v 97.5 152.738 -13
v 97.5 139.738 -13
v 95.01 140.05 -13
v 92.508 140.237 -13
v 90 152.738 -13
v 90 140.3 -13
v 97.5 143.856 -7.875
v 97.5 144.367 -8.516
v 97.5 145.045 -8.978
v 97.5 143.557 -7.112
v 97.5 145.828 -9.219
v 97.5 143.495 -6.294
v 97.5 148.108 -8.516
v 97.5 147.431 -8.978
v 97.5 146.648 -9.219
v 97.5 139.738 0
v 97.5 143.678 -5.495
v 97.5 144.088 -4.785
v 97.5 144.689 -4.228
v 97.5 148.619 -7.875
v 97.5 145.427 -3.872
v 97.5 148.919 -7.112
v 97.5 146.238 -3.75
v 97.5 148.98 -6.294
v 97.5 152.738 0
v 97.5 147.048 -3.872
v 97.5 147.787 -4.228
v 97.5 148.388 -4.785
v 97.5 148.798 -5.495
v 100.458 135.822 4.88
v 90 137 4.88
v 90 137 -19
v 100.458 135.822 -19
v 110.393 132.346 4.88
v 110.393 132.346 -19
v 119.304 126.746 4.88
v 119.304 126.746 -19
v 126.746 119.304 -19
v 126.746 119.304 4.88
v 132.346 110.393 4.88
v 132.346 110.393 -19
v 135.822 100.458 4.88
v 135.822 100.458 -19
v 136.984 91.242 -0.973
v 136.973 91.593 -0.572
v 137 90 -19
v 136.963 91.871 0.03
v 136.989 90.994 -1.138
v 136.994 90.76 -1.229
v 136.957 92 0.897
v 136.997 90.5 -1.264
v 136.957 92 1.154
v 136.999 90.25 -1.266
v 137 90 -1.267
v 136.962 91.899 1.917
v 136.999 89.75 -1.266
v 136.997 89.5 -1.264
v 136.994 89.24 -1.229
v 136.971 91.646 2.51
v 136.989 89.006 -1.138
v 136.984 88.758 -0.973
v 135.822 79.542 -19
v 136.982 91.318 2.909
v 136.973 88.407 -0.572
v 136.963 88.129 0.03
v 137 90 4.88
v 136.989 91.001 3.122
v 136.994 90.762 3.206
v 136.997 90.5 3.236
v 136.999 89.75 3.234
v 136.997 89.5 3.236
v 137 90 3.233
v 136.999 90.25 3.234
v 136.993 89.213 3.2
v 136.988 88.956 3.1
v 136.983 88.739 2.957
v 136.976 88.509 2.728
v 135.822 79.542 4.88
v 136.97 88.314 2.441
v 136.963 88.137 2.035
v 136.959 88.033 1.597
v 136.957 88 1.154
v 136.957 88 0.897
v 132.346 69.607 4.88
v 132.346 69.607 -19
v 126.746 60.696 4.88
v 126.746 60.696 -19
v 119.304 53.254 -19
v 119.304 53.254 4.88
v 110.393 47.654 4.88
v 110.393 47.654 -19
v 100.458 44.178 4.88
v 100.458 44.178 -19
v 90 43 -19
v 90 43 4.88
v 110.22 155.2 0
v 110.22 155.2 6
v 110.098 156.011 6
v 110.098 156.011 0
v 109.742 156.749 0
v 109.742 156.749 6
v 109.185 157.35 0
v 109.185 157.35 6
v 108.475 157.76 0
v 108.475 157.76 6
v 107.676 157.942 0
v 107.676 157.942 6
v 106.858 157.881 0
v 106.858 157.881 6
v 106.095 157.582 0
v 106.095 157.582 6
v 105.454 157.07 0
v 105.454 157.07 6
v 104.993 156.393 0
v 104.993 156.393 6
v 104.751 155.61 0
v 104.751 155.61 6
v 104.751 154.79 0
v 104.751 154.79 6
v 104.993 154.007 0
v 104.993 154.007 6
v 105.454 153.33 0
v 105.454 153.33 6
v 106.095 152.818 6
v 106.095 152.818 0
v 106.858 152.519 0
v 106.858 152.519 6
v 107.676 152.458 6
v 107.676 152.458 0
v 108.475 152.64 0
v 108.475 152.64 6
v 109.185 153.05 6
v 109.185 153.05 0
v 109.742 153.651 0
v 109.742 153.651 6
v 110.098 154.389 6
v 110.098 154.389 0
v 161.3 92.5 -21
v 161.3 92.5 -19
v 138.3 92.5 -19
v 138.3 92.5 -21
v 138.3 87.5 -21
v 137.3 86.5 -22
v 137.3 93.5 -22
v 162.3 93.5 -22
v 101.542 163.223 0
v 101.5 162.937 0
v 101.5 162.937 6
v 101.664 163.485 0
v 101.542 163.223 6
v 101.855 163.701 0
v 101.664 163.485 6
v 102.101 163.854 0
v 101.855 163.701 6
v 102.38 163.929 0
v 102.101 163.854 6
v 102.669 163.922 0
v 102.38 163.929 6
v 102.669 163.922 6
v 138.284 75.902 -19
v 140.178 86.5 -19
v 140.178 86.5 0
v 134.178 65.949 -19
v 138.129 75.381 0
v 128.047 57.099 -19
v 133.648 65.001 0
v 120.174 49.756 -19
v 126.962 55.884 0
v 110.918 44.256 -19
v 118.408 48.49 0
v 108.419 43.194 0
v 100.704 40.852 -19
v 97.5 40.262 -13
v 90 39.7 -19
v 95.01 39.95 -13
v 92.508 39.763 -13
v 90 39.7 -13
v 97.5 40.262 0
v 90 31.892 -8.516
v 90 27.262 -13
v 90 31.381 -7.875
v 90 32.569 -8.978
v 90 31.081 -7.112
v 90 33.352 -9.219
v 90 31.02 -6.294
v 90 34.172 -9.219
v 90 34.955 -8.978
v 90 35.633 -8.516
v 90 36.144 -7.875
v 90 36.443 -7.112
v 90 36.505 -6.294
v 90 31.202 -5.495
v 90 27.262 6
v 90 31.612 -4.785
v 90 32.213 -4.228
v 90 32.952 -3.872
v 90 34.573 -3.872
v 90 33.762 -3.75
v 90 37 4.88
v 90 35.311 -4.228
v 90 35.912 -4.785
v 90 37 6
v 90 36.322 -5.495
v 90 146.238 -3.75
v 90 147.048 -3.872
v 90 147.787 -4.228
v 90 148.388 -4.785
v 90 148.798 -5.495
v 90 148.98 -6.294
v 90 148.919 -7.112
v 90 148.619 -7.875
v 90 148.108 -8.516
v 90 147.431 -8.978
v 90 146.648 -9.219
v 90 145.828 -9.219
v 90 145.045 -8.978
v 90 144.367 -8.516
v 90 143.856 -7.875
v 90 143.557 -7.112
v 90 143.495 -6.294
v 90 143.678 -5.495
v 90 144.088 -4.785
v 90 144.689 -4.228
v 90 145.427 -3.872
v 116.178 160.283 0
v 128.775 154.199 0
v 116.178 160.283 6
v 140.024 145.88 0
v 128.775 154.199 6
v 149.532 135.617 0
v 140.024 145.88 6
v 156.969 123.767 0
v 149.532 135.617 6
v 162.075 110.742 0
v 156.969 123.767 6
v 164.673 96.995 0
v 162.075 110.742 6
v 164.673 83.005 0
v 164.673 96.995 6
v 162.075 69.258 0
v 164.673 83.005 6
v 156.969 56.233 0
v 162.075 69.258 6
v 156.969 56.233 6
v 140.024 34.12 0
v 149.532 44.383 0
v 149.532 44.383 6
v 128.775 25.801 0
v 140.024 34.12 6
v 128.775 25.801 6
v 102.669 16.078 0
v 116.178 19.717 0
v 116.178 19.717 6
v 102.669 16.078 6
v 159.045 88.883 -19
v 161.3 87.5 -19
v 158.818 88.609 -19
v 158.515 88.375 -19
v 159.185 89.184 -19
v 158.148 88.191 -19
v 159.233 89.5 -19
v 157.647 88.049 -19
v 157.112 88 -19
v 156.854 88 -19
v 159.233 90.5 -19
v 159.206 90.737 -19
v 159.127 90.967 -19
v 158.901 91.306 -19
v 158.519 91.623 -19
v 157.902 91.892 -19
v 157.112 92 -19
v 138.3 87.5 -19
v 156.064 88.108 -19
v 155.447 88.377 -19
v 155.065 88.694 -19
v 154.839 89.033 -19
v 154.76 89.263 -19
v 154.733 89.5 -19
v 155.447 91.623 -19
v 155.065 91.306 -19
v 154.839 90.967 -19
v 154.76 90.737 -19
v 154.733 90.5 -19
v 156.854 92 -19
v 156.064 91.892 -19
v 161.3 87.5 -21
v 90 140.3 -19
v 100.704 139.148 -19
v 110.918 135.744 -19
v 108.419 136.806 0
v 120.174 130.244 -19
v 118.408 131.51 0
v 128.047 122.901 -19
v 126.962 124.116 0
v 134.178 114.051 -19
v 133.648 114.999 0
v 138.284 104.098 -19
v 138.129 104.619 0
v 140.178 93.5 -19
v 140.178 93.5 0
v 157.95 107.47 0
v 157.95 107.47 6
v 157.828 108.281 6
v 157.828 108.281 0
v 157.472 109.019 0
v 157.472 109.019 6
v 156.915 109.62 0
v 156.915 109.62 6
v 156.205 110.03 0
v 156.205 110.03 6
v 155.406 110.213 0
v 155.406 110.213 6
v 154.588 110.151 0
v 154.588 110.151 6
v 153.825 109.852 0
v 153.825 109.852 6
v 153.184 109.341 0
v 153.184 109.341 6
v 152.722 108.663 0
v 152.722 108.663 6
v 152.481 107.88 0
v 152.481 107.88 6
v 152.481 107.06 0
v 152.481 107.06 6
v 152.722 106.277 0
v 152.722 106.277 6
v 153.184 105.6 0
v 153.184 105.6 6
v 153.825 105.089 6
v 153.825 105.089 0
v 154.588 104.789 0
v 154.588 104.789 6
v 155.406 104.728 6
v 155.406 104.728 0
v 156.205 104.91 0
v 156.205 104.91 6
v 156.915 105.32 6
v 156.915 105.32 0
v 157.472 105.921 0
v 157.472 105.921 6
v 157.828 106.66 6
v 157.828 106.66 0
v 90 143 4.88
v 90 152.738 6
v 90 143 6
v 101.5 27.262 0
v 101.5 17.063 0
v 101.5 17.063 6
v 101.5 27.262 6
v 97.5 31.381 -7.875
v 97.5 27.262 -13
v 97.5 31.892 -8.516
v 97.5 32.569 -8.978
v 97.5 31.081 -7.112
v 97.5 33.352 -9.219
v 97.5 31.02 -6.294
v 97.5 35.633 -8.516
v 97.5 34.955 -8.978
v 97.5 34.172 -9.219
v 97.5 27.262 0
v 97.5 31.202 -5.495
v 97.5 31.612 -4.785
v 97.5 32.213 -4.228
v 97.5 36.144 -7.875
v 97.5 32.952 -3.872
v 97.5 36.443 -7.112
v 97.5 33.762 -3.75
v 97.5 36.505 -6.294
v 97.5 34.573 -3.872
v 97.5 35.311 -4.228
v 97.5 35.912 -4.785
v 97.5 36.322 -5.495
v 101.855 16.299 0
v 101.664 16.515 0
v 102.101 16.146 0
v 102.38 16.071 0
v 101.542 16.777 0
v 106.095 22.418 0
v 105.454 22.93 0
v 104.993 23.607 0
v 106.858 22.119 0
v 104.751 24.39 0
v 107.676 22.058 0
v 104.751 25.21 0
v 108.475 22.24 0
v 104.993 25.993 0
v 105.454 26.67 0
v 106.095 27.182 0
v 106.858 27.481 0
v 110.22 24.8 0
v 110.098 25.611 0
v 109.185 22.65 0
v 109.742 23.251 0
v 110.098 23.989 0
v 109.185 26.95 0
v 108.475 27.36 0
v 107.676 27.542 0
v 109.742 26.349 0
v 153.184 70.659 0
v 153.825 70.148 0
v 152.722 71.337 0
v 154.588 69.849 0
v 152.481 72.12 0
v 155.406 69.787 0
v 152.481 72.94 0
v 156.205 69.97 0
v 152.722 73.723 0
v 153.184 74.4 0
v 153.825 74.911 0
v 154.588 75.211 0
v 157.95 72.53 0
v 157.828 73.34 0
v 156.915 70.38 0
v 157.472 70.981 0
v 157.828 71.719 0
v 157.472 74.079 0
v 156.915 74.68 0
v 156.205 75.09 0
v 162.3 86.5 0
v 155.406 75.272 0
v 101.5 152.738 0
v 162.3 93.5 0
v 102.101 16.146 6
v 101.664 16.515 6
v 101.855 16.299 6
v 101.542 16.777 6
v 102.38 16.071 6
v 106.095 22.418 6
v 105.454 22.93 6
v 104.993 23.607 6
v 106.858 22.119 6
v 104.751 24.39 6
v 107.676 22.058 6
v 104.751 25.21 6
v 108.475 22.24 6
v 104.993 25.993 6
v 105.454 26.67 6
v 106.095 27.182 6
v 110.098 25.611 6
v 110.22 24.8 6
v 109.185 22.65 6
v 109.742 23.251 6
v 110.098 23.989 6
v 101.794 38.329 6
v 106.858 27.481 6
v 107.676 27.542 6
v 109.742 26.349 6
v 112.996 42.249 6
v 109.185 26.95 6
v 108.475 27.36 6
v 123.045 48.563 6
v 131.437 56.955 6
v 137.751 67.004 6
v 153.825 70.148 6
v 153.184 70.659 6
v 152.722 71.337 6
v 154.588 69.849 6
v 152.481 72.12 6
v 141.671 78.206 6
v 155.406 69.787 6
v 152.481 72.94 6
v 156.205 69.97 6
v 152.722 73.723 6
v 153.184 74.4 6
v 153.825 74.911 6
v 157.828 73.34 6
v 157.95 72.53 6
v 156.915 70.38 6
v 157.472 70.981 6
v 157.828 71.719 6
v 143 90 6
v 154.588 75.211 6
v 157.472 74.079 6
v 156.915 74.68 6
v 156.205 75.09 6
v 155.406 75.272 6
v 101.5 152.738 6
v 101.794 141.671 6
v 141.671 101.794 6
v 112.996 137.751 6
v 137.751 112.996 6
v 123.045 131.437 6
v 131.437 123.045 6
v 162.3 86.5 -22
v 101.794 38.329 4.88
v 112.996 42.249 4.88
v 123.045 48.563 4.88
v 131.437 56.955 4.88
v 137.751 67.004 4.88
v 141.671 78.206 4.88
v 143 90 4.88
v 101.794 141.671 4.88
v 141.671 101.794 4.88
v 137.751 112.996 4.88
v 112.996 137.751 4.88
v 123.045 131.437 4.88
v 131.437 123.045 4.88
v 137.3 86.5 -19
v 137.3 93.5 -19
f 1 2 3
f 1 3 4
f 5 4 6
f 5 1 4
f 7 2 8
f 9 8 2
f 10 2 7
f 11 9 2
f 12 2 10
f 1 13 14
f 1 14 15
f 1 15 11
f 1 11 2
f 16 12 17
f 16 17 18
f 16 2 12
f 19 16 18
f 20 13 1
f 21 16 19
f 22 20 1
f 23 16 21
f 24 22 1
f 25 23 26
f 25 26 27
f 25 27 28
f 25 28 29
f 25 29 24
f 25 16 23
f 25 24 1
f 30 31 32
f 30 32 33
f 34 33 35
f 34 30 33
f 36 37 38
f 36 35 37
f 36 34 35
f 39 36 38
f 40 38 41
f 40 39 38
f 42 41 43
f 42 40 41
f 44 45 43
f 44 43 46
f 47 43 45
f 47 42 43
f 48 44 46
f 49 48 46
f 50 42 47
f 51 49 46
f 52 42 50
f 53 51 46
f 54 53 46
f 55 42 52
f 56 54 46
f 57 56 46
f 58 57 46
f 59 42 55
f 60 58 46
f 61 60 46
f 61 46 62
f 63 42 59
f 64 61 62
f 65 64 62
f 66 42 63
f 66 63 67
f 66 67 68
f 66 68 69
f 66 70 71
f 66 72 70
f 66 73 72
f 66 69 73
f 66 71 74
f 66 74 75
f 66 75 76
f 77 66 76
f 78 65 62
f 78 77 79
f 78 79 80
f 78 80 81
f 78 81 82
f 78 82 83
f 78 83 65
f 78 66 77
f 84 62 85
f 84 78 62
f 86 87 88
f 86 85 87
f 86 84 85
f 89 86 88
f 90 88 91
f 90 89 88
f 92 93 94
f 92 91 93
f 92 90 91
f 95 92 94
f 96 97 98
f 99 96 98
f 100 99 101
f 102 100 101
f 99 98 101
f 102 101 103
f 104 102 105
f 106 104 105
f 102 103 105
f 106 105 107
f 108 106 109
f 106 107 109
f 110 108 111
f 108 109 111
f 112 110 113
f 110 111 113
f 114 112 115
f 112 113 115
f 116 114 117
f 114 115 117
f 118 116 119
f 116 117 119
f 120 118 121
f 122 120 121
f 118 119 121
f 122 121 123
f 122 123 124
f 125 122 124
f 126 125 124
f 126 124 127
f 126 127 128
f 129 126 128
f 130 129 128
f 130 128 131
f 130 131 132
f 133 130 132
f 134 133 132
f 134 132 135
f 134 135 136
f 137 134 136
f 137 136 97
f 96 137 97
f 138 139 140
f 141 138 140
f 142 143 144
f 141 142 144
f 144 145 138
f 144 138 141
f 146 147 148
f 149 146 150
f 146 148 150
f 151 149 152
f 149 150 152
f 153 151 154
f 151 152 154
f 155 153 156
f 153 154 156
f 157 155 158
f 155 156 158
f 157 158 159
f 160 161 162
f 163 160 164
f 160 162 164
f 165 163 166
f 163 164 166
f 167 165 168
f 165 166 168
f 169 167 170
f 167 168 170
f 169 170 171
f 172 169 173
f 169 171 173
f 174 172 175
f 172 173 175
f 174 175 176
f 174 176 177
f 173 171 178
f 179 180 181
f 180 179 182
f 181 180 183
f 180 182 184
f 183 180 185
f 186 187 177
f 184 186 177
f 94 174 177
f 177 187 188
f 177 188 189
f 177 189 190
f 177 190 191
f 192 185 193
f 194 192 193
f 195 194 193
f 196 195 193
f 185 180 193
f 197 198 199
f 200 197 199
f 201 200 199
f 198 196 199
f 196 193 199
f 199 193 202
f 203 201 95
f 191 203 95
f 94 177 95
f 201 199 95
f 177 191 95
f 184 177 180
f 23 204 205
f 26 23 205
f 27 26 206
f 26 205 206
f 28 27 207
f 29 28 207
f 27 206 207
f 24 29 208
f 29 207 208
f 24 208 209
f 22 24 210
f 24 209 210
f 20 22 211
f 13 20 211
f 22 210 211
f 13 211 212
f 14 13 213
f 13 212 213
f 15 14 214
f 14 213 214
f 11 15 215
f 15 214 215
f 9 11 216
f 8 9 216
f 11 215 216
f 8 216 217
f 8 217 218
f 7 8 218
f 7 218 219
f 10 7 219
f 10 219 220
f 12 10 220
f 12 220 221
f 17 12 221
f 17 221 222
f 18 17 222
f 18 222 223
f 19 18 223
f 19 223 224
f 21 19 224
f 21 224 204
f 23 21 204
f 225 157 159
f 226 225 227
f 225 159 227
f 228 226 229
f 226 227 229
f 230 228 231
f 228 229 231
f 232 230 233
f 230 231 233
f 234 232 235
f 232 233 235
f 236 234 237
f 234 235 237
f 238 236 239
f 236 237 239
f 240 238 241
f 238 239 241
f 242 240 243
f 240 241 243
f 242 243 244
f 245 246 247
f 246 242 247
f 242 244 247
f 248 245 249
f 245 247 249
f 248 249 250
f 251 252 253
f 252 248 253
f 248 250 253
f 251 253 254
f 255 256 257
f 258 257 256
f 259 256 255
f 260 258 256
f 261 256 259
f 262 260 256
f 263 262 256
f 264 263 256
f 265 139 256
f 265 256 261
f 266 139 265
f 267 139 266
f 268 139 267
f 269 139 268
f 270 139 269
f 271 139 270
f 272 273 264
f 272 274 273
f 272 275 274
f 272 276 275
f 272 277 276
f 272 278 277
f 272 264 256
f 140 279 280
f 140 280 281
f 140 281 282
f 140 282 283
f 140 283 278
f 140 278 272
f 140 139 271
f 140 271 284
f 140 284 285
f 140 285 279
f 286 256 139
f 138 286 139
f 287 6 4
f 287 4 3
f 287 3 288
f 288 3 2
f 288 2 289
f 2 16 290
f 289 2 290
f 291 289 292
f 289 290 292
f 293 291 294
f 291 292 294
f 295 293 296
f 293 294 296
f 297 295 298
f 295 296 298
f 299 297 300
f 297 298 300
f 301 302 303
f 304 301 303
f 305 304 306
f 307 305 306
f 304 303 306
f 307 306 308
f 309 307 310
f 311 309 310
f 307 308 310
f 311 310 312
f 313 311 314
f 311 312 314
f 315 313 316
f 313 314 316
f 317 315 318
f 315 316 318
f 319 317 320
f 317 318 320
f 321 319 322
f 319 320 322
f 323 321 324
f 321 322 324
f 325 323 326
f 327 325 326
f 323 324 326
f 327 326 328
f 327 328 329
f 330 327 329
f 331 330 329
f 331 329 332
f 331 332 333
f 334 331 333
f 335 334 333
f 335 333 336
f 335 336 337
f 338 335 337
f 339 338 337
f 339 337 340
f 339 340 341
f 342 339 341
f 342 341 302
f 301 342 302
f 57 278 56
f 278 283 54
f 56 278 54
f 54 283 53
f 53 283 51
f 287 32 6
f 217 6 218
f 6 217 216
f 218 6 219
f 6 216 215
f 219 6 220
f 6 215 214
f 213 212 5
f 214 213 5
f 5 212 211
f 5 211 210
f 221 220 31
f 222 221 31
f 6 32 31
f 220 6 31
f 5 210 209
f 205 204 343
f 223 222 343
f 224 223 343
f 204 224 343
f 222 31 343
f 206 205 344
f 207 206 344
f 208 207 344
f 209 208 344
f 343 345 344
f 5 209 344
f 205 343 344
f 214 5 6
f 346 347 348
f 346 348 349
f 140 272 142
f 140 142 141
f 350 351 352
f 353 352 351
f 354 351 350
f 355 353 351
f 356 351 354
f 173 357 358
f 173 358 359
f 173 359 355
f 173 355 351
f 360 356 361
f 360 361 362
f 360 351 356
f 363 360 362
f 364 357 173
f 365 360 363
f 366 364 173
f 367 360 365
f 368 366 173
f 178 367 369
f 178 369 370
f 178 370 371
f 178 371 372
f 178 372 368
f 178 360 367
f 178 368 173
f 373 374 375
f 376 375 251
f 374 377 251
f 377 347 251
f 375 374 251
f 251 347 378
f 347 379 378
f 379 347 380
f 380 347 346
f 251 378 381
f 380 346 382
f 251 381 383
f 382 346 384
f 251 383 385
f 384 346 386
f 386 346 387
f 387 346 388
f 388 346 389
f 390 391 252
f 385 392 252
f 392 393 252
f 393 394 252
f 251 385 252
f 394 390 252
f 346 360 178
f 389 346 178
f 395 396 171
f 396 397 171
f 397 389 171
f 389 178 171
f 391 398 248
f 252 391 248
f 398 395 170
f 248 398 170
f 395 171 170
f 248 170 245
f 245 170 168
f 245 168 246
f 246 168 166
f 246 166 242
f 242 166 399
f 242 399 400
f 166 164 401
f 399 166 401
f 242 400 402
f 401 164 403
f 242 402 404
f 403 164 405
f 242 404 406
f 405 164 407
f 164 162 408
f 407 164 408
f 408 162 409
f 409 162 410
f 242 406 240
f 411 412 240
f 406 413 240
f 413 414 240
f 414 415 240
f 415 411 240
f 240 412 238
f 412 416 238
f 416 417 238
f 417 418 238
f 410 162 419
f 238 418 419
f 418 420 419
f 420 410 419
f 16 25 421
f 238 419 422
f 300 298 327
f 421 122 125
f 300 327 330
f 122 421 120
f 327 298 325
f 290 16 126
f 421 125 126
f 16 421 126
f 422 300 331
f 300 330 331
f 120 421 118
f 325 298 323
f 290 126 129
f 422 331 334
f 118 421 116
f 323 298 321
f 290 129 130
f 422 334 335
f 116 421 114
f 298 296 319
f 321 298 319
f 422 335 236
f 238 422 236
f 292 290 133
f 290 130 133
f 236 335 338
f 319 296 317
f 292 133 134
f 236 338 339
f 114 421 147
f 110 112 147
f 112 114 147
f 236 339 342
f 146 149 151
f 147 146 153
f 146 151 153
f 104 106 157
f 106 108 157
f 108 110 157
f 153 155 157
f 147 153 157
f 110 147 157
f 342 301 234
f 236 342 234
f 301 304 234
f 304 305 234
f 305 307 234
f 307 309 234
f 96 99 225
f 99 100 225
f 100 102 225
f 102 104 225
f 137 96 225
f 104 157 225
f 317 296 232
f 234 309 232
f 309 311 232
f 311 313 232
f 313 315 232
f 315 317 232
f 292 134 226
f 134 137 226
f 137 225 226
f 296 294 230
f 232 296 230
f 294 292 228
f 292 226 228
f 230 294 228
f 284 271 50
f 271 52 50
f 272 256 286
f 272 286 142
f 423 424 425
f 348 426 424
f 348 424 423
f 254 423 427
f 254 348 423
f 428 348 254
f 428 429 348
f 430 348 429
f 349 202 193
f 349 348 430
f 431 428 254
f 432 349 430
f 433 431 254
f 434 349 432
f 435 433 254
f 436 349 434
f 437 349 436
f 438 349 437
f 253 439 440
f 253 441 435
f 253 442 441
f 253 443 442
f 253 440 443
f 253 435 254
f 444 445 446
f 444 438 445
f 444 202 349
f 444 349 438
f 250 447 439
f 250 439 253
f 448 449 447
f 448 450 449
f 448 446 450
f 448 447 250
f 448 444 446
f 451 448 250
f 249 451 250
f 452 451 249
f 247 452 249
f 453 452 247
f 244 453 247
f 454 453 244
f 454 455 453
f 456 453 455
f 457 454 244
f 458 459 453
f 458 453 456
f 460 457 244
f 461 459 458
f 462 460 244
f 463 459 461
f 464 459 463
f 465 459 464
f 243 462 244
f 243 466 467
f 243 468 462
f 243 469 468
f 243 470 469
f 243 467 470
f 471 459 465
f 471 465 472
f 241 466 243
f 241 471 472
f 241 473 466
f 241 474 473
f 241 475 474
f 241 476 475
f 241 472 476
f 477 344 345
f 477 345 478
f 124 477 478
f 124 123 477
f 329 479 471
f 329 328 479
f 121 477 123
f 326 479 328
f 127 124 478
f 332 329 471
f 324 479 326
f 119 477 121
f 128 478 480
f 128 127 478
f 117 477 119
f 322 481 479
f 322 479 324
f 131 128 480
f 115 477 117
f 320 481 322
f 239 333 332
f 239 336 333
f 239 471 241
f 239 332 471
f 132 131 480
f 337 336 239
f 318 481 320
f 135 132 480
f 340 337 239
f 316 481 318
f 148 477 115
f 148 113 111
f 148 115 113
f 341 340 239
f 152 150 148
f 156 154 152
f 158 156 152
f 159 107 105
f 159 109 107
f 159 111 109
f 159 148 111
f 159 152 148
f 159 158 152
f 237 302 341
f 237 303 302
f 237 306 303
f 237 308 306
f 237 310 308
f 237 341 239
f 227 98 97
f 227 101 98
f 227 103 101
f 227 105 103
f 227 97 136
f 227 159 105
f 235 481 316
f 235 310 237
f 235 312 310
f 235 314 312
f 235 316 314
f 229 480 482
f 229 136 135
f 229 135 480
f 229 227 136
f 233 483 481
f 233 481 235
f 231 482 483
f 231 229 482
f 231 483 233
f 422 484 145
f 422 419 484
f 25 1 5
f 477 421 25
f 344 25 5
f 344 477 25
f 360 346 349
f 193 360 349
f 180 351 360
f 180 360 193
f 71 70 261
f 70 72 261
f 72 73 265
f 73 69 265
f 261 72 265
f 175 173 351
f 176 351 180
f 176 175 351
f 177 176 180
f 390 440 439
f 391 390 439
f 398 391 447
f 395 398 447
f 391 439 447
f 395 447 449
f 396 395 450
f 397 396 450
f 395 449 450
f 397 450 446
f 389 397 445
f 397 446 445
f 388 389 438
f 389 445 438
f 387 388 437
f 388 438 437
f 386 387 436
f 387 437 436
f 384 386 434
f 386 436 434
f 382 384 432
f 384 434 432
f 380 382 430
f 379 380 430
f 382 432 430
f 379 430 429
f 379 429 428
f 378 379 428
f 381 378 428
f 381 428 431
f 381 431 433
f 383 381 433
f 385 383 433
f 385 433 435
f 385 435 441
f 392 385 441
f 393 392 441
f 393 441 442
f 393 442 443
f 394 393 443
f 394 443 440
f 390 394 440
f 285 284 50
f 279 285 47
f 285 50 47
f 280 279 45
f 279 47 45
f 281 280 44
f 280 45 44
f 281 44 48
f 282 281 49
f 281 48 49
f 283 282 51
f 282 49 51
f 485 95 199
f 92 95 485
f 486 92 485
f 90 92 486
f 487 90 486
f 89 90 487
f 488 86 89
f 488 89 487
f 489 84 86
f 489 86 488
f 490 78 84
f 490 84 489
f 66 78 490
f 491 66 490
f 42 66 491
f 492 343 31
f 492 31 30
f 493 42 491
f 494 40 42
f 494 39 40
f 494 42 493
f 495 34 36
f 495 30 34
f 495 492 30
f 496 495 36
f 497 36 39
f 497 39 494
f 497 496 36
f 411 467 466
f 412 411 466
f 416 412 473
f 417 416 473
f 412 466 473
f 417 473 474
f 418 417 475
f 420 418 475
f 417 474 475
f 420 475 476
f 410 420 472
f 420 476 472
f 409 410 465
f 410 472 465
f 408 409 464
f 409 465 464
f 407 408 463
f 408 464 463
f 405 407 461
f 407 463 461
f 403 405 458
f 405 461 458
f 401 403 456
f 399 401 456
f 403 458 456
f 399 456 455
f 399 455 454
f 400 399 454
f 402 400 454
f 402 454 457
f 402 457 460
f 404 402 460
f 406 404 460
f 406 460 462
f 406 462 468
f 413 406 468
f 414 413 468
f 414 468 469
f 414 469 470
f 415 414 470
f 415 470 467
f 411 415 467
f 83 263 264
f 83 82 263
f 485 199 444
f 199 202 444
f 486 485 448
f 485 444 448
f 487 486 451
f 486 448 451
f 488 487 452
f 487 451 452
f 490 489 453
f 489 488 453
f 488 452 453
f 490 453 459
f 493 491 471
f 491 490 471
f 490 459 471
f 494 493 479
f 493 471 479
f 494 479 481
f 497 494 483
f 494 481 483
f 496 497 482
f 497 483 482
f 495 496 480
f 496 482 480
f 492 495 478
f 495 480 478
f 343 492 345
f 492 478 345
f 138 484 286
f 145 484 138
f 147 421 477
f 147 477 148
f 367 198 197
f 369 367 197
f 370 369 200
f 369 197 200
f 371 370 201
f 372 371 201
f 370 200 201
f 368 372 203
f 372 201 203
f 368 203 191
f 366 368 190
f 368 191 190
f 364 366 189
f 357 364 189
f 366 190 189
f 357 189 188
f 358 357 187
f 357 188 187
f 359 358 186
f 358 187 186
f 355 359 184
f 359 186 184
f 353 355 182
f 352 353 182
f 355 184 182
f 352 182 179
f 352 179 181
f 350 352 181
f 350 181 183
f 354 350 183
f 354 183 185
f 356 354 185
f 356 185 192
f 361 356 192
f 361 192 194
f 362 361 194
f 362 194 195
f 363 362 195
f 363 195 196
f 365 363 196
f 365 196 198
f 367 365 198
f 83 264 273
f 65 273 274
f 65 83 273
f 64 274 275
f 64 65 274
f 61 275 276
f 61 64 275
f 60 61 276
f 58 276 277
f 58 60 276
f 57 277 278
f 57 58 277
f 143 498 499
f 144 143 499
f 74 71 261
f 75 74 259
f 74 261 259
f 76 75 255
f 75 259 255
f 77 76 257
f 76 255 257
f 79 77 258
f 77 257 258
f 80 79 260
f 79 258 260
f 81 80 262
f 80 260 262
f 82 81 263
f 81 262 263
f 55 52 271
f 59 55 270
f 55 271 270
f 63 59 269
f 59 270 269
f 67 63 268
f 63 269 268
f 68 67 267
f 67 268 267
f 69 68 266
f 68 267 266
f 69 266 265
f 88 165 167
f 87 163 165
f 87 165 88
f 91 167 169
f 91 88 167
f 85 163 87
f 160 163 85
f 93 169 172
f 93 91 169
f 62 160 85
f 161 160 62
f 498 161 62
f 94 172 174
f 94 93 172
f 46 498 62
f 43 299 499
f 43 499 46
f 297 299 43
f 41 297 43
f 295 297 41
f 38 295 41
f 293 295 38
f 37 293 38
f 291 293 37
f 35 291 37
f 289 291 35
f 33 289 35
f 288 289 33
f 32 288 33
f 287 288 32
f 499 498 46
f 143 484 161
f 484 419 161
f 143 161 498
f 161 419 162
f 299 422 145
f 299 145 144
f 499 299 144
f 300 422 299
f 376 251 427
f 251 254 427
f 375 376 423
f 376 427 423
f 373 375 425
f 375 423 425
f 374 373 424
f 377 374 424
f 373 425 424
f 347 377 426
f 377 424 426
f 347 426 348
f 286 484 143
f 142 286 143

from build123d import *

# Parameters (mm, degrees)
SKETCH1_W                = 180
SKETCH1_H                = 180
BOSS_EXTRUDE1_DEPTH      = 6
SKETCH2_R                = 50.3
SKETCH2_R_2              = 46.3
BOSS_EXTRUDE2_DEPTH      = 19
CUT_EXTRUDE1_DEPTH       = 256.266527379
CUT_EXTRUDE1_DEPTH_BACK  = 256.266527379
SKETCH3_R                = 47
BOSS_EXTRUDE3_DEPTH      = 60
FILLET4_R                = 3
M5_CLEARANCE_HOLE1_D     = 5.5
SKETCH15_W               = 25
SKETCH15_H               = 7
BOSS_EXTRUDE5_DEPTH      = 19
CUT_EXTRUDE3_DEPTH       = 2
FILLET5_R                = 1.5
CUT_EXTRUDE4_REACH       = 264.975
CUT_EXTRUDE5_REACH       = 244.499
SKETCH33_W               = 1
SKETCH33_H               = 25
SKETCH35_W               = 15
SKETCH35_H               = 13
BOSS_EXTRUDE6_DEPTH      = 13
M5_CLEARANCE_HOLE2_D     = 5.5
CUT_EXTRUDE6_DEPTH       = 4.2
CUT_EXTRUDE7_REACH       = 242.936
SKETCH41_W               = 23
SKETCH41_H               = 15
FILLET8_R                = 1
CUT_EXTRUDE8_REACH       = 197.694
SKETCH47_R               = 53
CUT_EXTRUDE10_DEPTH      = 1.12
CUT_EXTRUDE12_DEPTH      = 238.295626108
CUT_EXTRUDE12_DEPTH_BACK = 238.295626108
SKETCH51_W               = 150
SKETCH51_H               = 200
SKETCH52_W               = 25
SKETCH52_H               = 7
SKETCH52_W_2             = 23
SKETCH52_H_2             = 5
BOSS_EXTRUDE9_DEPTH      = 3
CHAMFER1_SIZE            = 1


with BuildPart() as part:
    # Sketch1 → Boss-Extrude1 (new body)
    with BuildSketch(Plane.XY):
        with Locations((90, 90)):
            Rectangle(SKETCH1_W, SKETCH1_H)
    extrude(amount=BOSS_EXTRUDE1_DEPTH)

    # Sketch2 → Boss-Extrude2 (add)
    with BuildSketch(Plane(origin=(0, 0, 0), x_dir=(-1, 0, 0), z_dir=(0, 0, -1))):
        with Locations((-90, 90)):
            Circle(SKETCH2_R)
        with Locations((-90, 90)):
            Circle(SKETCH2_R_2, mode=Mode.SUBTRACT)
    extrude(amount=BOSS_EXTRUDE2_DEPTH)

    # Sketch3 → Cut-Extrude1 (cut, two sides: drawn at the far end of the back side and taken through both)
    with BuildSketch(Plane(origin=(0, 0, 0), x_dir=(-1, 0, 0), z_dir=(0, 0, -1)).offset(-CUT_EXTRUDE1_DEPTH_BACK)):
        with Locations((-90, 90)):
            Circle(SKETCH3_R)
    extrude(amount=CUT_EXTRUDE1_DEPTH + CUT_EXTRUDE1_DEPTH_BACK, mode=Mode.SUBTRACT)

    # Sketch4 → Boss-Extrude3 (add)
    with BuildSketch(Plane(origin=(0, 0, 0), x_dir=(-1, 0, 0), z_dir=(0, 0, -1))):
        with BuildLine():
            Line((0, 77.5), (0, 102.5))
            Line((0, 102.5), (-41.277931078, 102.5))
            ThreePointArc((-41.277931078, 102.5), (-39.7, 90), (-41.277931078, 77.5))
            Line((-41.277931078, 77.5), (0, 77.5))
        make_face()
    extrude(amount=BOSS_EXTRUDE3_DEPTH)

    # Fillet4
    fillet4_edges = [part.edges().sort_by_distance(p)[0] for p in [
        (41.277931078, 102.5, -9.5),
        (41.277931078, 77.5, -9.5),
    ]]
    fillet(fillet4_edges, radius=FILLET4_R)

    # M5 Clearance Hole1 (through all)
    with Locations(Plane(origin=(0, 0, 0), x_dir=(-1, 0, 0), z_dir=(0, 0, -1))):
        with Locations((-107.470285544, 155.199993275), (-155.199993275, 107.470285544), (-155.199993275, 72.529714456), (-107.470285544, 24.800006725), (-72.529714456, 24.800006725), (-24.800006725, 72.529714456), (-24.800006725, 107.470285544), (-72.529714456, 155.199993275)):
            Hole(M5_CLEARANCE_HOLE1_D / 2)

    # Sketch15 → Boss-Extrude5 (add)
    with BuildSketch(Plane(origin=(0, 0, 0), x_dir=(-1, 0, 0), z_dir=(0, 0, -1))):
        with Locations((-149.8, 90)):
            Rectangle(SKETCH15_W, SKETCH15_H)
    extrude(amount=BOSS_EXTRUDE5_DEPTH)

    # Sketch17 → Cut-Extrude3 (cut, symmetric)
    with BuildSketch(Plane(origin=(0, 90, 0), x_dir=(0, 0, -1), z_dir=(0, 1, 0))):
        Polygon((19, -154.732971354), (-1.044131231, -134.688840123), (-5.544131231, -134.688840123), (19, -159.232971354), align=None)
        Polygon((-5.544131231, -134.688840123), (-1.044131231, -134.688840123), (19, -154.732971354), (19, -159.232971354), align=None)
    extrude(amount=CUT_EXTRUDE3_DEPTH, both=True, mode=Mode.SUBTRACT)

    # Fillet5
    fillet5_edges = [part.edges().sort_by_distance(p)[0] for p in [
        (145.845199441, 92, -10.112228087),
        (145.845199441, 88, -10.112228087),
        (148.095199441, 92, -7.862228087),
        (148.095199441, 88, -7.862228087),
    ]]
    fillet(fillet5_edges, radius=FILLET5_R)

    # Sketch31 → Cut-Extrude4 (cut, up to next)
    with BuildSketch(Plane.XY.offset(6), mode=Mode.PRIVATE) as cut_extrude4_sk1:
        with BuildLine():
            Line((0, 180), (0, 102.5))
            Line((0, 102.5), (16.049002711, 102.5))
            ThreePointArc((16.049002711, 102.5), (165, 90), (16.049002711, 77.5))
            Line((16.049002711, 77.5), (0, 77.5))
            Line((0, 77.5), (0, 0))
            Line((0, 0), (180, 0))
            Line((180, 0), (180, 180))
            Line((180, 180), (0, 180))
        make_face()
    cut_extrude4_tool1 = extrude(cut_extrude4_sk1.sketch, amount=-CUT_EXTRUDE4_REACH, mode=Mode.PRIVATE) & part.part
    add(cut_extrude4_tool1.solids().sort_by_distance((2.545584, 141.25, 6))[0], mode=Mode.SUBTRACT)

    # Sketch33 → Cut-Extrude5 (cut, up to next)
    with BuildSketch(Plane.XY.offset(6), mode=Mode.PRIVATE) as cut_extrude5_sk1:
        with Locations((0.5, 90)):
            Rectangle(SKETCH33_W, SKETCH33_H)
    cut_extrude5_tool1 = extrude(cut_extrude5_sk1.sketch, amount=-CUT_EXTRUDE5_REACH, mode=Mode.PRIVATE) & part.part
    add(cut_extrude5_tool1.solids().sort_by_distance((0.5, 90, 6))[0], mode=Mode.SUBTRACT)

    # Sketch35 → Boss-Extrude6 (add)
    with BuildSketch(Plane(origin=(0, 0, 0), x_dir=(-1, 0, 0), z_dir=(0, 0, -1))):
        with Locations((-90, 146.23771205)):
            Rectangle(SKETCH35_W, SKETCH35_H)
        with Locations((-90, 33.76228795)):
            Rectangle(SKETCH35_W, SKETCH35_H)
    extrude(amount=BOSS_EXTRUDE6_DEPTH)

    # M5 Clearance Hole2 (through all)
    with Locations(Plane(origin=(97.5, 0, 0), x_dir=(0, 0, -1), z_dir=(1, 0, 0))):
        with Locations((6.5, 146.23771205), (6.5, 33.76228795)):
            Hole(M5_CLEARANCE_HOLE2_D / 2)

    # Sketch40 → Cut-Extrude6 (cut)
    with BuildSketch(Plane.ZY.offset(-82.5)):
        Polygon((-10.75, 143.783973406), (-6.5, 141.330234762), (-2.25, 143.783973406), (-2.25, 148.691450694), (-6.5, 151.145189338), (-10.75, 148.691450694), align=None)
        Polygon((-2.25, 31.308549306), (-2.25, 36.216026594), (-6.5, 38.669765238), (-10.75, 36.216026594), (-10.75, 31.308549306), (-6.5, 28.854810662), align=None)
    extrude(amount=-CUT_EXTRUDE6_DEPTH, mode=Mode.SUBTRACT)

    # Sketch41 → Cut-Extrude7 (cut, up to next)
    with BuildSketch(Plane(origin=(0, 0, 0), x_dir=(-1, 0, 0), z_dir=(0, 0, -1)), mode=Mode.PRIVATE) as cut_extrude7_sk1:
        with Locations((-90, 160.23771205)):
            Rectangle(SKETCH41_W, SKETCH41_H)
    cut_extrude7_tool1 = extrude(cut_extrude7_sk1.sketch, amount=-CUT_EXTRUDE7_REACH, mode=Mode.PRIVATE) & part.part
    # Sketch41 → Cut-Extrude7 (cut, up to next)
    with BuildSketch(Plane(origin=(0, 0, 0), x_dir=(-1, 0, 0), z_dir=(0, 0, -1)), mode=Mode.PRIVATE) as cut_extrude7_sk2:
        with Locations((-90, 19.76228795)):
            Rectangle(SKETCH41_W, SKETCH41_H)
    cut_extrude7_tool2 = extrude(cut_extrude7_sk2.sketch, amount=-CUT_EXTRUDE7_REACH, mode=Mode.PRIVATE) & part.part
    add(cut_extrude7_tool1.solids().sort_by_distance((90, 160.237712, 0))[0], mode=Mode.SUBTRACT)
    add(cut_extrude7_tool2.solids().sort_by_distance((90, 19.762288, 0))[0], mode=Mode.SUBTRACT)

    # Fillet8
    fillet8_edges = [part.edges().sort_by_distance(p)[0] for p in [
        (101.5, 164.113089262, 3),
        (78.5, 164.113089262, 3),
        (78.5, 15.886910738, 3),
        (101.5, 15.886910738, 3),
    ]]
    fillet(fillet8_edges, radius=FILLET8_R)

    # Sketch42 → Cut-Extrude8 (cut, up to next)
    with BuildSketch(Plane(origin=(0, 102.5, 0), x_dir=(1, 0, 0), z_dir=(0, 1, 0)), mode=Mode.PRIVATE) as cut_extrude8_sk1:
        Polygon((15, -6), (1, 24), (1, -6), align=None)
    cut_extrude8_tool1 = extrude(cut_extrude8_sk1.sketch, amount=-CUT_EXTRUDE8_REACH, mode=Mode.PRIVATE) & part.part
    add(cut_extrude8_tool1.solids().sort_by_distance((5.666667, 102.5, -4))[0], mode=Mode.SUBTRACT)

    # Sketch47 → Cut-Extrude10 (cut)
    with BuildSketch(Plane.XY.offset(6)):
        with Locations((90, 90)):
            Circle(SKETCH47_R)
    extrude(amount=-CUT_EXTRUDE10_DEPTH, mode=Mode.SUBTRACT)

    # Sketch51 → Cut-Extrude12 (cut, two sides: drawn at the far end of the back side and taken through both)
    with BuildSketch(Plane(origin=(0, 0, -13), x_dir=(-1, 0, 0), z_dir=(0, 0, -1)).offset(-CUT_EXTRUDE12_DEPTH_BACK)):
        with Locations((-15, 90)):
            Rectangle(SKETCH51_W, SKETCH51_H)
    extrude(amount=CUT_EXTRUDE12_DEPTH + CUT_EXTRUDE12_DEPTH_BACK, mode=Mode.SUBTRACT)

    # Sketch52 → Boss-Extrude9 (add)
    with BuildSketch(Plane(origin=(0, 0, -19), x_dir=(-1, 0, 0), z_dir=(0, 0, -1))):
        with Locations((-149.8, 90)):
            Rectangle(SKETCH52_W, SKETCH52_H)
        with Locations((-149.8, 90)):
            Rectangle(SKETCH52_W_2, SKETCH52_H_2, mode=Mode.SUBTRACT)
    extrude(amount=BOSS_EXTRUDE9_DEPTH)

    # Chamfer1
    chamfer1_edges = [part.edges().sort_by_distance(p)[0] for p in [
        (161.3, 90, -22),
        (149.8, 87.5, -22),
        (138.3, 90, -22),
        (149.8, 92.5, -22),
    ]]
    chamfer(chamfer1_edges, length=CHAMFER1_SIZE - 0.0001)  # a hair under: the kernel refuses the full size


solid = part.part
